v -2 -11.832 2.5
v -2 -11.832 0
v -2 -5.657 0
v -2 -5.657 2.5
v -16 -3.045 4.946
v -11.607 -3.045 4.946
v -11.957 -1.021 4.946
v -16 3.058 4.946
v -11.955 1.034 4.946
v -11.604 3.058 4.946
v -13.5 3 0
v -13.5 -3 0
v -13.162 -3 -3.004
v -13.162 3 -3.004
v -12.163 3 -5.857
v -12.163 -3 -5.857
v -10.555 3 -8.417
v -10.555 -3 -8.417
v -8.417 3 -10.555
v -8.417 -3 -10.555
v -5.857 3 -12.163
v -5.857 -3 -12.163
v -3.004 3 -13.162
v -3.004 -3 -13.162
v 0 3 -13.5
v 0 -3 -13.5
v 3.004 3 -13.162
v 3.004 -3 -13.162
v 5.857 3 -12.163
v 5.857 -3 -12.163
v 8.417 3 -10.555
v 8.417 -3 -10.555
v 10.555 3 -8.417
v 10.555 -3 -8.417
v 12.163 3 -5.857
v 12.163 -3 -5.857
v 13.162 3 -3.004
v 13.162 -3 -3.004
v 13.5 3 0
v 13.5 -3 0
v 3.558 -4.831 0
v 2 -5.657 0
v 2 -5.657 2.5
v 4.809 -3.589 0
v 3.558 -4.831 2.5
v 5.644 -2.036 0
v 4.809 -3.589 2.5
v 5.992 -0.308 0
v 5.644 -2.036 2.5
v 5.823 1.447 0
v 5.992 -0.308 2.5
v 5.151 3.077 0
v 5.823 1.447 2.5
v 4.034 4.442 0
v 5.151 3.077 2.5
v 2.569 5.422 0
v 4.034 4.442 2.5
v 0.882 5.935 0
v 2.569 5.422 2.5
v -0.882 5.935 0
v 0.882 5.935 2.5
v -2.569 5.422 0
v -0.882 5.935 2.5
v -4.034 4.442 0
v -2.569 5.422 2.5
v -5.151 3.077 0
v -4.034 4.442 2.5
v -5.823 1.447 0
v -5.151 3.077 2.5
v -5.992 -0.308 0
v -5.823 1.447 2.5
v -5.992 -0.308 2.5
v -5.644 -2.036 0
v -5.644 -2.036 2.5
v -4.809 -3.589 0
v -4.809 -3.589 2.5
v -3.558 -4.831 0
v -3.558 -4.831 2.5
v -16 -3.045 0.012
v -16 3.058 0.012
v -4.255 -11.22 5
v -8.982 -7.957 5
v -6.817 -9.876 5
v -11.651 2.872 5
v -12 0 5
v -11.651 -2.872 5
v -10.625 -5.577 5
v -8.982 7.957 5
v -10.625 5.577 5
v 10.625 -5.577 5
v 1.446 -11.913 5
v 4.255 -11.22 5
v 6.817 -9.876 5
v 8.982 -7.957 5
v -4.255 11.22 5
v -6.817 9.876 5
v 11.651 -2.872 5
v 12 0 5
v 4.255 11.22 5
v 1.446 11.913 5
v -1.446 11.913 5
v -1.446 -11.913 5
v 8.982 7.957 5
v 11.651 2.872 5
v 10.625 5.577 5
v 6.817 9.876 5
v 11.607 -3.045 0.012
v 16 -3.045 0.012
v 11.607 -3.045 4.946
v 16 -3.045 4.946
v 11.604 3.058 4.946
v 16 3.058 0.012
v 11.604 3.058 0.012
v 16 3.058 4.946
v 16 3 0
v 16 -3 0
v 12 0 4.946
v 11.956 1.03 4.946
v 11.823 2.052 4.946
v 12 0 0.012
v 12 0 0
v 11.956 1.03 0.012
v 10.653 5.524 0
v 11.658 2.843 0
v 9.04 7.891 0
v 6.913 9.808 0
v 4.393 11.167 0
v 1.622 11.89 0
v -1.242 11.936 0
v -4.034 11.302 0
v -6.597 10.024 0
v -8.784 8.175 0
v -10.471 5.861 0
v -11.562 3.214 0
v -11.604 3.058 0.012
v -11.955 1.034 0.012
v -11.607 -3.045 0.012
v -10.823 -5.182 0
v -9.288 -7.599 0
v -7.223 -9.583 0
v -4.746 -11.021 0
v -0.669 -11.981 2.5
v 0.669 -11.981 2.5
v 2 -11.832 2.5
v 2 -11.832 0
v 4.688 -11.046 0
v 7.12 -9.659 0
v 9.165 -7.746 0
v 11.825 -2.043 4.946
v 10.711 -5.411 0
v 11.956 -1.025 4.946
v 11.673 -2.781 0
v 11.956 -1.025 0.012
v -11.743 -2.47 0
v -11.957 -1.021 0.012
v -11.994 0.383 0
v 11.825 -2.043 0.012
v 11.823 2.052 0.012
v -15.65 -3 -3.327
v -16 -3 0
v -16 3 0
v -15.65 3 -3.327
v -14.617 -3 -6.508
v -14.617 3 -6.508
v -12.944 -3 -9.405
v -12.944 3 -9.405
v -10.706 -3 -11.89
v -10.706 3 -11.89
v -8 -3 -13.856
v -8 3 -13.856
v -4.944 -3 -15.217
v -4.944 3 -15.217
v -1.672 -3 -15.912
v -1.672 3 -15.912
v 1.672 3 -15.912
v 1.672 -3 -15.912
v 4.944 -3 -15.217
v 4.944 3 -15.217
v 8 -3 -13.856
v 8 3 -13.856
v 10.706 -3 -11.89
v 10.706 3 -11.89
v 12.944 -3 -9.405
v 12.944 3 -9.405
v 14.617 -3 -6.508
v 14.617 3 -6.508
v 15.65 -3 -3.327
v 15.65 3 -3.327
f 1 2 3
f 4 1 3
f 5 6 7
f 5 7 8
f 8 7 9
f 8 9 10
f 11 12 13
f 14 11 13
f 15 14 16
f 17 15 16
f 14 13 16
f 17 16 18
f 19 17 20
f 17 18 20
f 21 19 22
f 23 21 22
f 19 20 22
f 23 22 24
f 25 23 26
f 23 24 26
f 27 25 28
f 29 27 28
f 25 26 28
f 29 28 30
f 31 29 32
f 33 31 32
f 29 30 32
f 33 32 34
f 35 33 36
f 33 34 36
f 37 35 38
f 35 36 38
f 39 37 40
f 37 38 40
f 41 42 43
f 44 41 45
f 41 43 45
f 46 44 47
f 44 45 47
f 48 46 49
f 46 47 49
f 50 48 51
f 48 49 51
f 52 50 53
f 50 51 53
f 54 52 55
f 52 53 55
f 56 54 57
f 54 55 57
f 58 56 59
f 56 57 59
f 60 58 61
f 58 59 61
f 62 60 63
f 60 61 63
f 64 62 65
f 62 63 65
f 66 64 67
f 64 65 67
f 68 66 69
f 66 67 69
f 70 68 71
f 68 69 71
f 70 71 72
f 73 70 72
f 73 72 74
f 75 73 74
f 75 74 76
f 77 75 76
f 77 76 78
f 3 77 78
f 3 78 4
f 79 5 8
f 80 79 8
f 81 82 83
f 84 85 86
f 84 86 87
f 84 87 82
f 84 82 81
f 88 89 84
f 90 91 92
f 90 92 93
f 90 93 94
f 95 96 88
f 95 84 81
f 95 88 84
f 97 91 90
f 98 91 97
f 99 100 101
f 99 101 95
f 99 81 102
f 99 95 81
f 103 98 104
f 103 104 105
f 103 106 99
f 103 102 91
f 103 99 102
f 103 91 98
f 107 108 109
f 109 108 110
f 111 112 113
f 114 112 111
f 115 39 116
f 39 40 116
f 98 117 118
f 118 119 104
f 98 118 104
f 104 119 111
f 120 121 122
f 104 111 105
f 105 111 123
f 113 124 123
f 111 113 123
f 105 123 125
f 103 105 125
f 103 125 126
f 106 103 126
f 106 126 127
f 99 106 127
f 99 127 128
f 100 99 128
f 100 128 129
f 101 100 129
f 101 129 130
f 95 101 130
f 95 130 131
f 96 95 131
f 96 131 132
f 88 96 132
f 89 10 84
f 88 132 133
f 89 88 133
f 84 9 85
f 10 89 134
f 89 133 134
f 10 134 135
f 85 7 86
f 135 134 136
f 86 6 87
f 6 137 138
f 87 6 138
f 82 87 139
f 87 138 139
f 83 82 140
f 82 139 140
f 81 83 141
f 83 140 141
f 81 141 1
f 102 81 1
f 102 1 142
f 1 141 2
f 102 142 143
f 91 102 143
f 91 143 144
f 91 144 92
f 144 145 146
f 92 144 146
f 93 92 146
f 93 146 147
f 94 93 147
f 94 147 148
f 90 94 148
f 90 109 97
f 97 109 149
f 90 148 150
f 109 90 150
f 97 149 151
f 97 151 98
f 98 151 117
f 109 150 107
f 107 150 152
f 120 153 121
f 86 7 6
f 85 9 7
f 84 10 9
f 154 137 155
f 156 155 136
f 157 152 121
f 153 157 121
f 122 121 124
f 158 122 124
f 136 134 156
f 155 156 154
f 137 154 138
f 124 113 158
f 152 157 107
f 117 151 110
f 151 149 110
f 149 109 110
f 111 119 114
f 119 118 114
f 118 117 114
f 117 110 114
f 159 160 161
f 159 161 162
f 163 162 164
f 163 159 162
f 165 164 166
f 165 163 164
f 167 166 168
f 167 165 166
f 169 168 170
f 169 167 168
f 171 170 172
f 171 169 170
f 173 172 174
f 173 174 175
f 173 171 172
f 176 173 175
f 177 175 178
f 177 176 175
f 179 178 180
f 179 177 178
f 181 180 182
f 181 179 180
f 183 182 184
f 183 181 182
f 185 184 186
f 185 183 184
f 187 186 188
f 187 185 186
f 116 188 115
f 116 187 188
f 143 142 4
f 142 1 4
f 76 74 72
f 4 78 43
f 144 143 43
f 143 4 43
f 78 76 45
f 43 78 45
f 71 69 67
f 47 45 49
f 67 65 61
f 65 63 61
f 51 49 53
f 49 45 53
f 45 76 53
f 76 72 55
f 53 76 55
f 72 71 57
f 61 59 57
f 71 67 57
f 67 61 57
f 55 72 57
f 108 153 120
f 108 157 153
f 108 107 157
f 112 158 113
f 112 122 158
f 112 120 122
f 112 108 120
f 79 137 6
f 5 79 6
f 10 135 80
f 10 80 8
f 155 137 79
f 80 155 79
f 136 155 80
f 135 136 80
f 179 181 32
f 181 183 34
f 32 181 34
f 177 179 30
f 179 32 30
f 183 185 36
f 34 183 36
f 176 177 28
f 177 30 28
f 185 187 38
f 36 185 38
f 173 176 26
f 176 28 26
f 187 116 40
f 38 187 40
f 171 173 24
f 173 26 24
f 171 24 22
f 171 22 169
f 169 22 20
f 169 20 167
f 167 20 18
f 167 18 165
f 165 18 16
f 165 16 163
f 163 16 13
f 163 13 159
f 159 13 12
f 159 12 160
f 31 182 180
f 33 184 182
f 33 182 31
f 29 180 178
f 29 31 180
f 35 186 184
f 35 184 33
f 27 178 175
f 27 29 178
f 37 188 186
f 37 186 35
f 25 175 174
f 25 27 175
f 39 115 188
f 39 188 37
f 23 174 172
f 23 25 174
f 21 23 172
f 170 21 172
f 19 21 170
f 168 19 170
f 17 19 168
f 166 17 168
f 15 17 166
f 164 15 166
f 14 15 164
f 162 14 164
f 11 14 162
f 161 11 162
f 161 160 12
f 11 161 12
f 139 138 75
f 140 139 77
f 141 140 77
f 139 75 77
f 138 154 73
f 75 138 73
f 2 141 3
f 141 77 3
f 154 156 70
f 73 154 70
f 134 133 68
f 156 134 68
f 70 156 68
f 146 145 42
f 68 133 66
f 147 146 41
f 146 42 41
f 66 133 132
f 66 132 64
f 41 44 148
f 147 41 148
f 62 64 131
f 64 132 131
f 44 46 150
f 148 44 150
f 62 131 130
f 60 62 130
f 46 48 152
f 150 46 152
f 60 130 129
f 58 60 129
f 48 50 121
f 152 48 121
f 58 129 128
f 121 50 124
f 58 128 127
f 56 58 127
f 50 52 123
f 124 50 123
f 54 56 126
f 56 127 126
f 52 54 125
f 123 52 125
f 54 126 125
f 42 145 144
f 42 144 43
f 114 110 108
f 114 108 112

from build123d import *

# Parameters (mm, degrees)
SKETCH002_W  = 6.103832
SKETCH002_H  = 4.93409
PAD_DEPTH    = 16
SKETCH001_R  = 12
PAD001_DEPTH = 5
SKETCH_R     = 6
POCKET_DEPTH = 2.5
BOX_W        = 4
BOX_H        = 10
BOX_DEPTH    = 2.6
PAD002_DEPTH = 3


with BuildPart() as body:
    # Sketch002 → Pad (new body, symmetric)
    with BuildSketch(Plane.YZ):
        with Locations((0.006563, 2.478979)):
            Rectangle(SKETCH002_W, SKETCH002_H)
    extrude(amount=PAD_DEPTH, both=True)

    # Sketch001 → Pad001 (join)
    with BuildSketch(Plane.XY):
        Circle(SKETCH001_R)
    extrude(amount=PAD001_DEPTH)

    # Sketch → Pocket (cut, symmetric)
    with BuildSketch(Plane.XY):
        Circle(SKETCH_R)
    extrude(amount=POCKET_DEPTH, both=True, mode=Mode.SUBTRACT)

    # Box → Box (cut)
    with BuildSketch(Plane(origin=(-2, -15, -0.1), x_dir=(1, 0, 0), z_dir=(0, 0, 1))):
        with Locations((2, 5)):
            Rectangle(BOX_W, BOX_H)
    extrude(amount=BOX_DEPTH, mode=Mode.SUBTRACT)


with BuildPart() as body001:
    # Sketch003 (on Sketch) → Pad002 (new body, symmetric)
    with BuildSketch(Plane.XZ):
        with BuildLine():
            ThreePointArc((-13.5, 0), (0, -13.5), (13.5, 0))
            Line((13.5, 0), (16, 0))
            ThreePointArc((-16, 0), (0, -16), (16, 0))
            Line((-16, 0), (-13.5, 0))
        make_face()
    extrude(amount=PAD002_DEPTH, both=True)


solid = Compound([body.part, body001.part])
